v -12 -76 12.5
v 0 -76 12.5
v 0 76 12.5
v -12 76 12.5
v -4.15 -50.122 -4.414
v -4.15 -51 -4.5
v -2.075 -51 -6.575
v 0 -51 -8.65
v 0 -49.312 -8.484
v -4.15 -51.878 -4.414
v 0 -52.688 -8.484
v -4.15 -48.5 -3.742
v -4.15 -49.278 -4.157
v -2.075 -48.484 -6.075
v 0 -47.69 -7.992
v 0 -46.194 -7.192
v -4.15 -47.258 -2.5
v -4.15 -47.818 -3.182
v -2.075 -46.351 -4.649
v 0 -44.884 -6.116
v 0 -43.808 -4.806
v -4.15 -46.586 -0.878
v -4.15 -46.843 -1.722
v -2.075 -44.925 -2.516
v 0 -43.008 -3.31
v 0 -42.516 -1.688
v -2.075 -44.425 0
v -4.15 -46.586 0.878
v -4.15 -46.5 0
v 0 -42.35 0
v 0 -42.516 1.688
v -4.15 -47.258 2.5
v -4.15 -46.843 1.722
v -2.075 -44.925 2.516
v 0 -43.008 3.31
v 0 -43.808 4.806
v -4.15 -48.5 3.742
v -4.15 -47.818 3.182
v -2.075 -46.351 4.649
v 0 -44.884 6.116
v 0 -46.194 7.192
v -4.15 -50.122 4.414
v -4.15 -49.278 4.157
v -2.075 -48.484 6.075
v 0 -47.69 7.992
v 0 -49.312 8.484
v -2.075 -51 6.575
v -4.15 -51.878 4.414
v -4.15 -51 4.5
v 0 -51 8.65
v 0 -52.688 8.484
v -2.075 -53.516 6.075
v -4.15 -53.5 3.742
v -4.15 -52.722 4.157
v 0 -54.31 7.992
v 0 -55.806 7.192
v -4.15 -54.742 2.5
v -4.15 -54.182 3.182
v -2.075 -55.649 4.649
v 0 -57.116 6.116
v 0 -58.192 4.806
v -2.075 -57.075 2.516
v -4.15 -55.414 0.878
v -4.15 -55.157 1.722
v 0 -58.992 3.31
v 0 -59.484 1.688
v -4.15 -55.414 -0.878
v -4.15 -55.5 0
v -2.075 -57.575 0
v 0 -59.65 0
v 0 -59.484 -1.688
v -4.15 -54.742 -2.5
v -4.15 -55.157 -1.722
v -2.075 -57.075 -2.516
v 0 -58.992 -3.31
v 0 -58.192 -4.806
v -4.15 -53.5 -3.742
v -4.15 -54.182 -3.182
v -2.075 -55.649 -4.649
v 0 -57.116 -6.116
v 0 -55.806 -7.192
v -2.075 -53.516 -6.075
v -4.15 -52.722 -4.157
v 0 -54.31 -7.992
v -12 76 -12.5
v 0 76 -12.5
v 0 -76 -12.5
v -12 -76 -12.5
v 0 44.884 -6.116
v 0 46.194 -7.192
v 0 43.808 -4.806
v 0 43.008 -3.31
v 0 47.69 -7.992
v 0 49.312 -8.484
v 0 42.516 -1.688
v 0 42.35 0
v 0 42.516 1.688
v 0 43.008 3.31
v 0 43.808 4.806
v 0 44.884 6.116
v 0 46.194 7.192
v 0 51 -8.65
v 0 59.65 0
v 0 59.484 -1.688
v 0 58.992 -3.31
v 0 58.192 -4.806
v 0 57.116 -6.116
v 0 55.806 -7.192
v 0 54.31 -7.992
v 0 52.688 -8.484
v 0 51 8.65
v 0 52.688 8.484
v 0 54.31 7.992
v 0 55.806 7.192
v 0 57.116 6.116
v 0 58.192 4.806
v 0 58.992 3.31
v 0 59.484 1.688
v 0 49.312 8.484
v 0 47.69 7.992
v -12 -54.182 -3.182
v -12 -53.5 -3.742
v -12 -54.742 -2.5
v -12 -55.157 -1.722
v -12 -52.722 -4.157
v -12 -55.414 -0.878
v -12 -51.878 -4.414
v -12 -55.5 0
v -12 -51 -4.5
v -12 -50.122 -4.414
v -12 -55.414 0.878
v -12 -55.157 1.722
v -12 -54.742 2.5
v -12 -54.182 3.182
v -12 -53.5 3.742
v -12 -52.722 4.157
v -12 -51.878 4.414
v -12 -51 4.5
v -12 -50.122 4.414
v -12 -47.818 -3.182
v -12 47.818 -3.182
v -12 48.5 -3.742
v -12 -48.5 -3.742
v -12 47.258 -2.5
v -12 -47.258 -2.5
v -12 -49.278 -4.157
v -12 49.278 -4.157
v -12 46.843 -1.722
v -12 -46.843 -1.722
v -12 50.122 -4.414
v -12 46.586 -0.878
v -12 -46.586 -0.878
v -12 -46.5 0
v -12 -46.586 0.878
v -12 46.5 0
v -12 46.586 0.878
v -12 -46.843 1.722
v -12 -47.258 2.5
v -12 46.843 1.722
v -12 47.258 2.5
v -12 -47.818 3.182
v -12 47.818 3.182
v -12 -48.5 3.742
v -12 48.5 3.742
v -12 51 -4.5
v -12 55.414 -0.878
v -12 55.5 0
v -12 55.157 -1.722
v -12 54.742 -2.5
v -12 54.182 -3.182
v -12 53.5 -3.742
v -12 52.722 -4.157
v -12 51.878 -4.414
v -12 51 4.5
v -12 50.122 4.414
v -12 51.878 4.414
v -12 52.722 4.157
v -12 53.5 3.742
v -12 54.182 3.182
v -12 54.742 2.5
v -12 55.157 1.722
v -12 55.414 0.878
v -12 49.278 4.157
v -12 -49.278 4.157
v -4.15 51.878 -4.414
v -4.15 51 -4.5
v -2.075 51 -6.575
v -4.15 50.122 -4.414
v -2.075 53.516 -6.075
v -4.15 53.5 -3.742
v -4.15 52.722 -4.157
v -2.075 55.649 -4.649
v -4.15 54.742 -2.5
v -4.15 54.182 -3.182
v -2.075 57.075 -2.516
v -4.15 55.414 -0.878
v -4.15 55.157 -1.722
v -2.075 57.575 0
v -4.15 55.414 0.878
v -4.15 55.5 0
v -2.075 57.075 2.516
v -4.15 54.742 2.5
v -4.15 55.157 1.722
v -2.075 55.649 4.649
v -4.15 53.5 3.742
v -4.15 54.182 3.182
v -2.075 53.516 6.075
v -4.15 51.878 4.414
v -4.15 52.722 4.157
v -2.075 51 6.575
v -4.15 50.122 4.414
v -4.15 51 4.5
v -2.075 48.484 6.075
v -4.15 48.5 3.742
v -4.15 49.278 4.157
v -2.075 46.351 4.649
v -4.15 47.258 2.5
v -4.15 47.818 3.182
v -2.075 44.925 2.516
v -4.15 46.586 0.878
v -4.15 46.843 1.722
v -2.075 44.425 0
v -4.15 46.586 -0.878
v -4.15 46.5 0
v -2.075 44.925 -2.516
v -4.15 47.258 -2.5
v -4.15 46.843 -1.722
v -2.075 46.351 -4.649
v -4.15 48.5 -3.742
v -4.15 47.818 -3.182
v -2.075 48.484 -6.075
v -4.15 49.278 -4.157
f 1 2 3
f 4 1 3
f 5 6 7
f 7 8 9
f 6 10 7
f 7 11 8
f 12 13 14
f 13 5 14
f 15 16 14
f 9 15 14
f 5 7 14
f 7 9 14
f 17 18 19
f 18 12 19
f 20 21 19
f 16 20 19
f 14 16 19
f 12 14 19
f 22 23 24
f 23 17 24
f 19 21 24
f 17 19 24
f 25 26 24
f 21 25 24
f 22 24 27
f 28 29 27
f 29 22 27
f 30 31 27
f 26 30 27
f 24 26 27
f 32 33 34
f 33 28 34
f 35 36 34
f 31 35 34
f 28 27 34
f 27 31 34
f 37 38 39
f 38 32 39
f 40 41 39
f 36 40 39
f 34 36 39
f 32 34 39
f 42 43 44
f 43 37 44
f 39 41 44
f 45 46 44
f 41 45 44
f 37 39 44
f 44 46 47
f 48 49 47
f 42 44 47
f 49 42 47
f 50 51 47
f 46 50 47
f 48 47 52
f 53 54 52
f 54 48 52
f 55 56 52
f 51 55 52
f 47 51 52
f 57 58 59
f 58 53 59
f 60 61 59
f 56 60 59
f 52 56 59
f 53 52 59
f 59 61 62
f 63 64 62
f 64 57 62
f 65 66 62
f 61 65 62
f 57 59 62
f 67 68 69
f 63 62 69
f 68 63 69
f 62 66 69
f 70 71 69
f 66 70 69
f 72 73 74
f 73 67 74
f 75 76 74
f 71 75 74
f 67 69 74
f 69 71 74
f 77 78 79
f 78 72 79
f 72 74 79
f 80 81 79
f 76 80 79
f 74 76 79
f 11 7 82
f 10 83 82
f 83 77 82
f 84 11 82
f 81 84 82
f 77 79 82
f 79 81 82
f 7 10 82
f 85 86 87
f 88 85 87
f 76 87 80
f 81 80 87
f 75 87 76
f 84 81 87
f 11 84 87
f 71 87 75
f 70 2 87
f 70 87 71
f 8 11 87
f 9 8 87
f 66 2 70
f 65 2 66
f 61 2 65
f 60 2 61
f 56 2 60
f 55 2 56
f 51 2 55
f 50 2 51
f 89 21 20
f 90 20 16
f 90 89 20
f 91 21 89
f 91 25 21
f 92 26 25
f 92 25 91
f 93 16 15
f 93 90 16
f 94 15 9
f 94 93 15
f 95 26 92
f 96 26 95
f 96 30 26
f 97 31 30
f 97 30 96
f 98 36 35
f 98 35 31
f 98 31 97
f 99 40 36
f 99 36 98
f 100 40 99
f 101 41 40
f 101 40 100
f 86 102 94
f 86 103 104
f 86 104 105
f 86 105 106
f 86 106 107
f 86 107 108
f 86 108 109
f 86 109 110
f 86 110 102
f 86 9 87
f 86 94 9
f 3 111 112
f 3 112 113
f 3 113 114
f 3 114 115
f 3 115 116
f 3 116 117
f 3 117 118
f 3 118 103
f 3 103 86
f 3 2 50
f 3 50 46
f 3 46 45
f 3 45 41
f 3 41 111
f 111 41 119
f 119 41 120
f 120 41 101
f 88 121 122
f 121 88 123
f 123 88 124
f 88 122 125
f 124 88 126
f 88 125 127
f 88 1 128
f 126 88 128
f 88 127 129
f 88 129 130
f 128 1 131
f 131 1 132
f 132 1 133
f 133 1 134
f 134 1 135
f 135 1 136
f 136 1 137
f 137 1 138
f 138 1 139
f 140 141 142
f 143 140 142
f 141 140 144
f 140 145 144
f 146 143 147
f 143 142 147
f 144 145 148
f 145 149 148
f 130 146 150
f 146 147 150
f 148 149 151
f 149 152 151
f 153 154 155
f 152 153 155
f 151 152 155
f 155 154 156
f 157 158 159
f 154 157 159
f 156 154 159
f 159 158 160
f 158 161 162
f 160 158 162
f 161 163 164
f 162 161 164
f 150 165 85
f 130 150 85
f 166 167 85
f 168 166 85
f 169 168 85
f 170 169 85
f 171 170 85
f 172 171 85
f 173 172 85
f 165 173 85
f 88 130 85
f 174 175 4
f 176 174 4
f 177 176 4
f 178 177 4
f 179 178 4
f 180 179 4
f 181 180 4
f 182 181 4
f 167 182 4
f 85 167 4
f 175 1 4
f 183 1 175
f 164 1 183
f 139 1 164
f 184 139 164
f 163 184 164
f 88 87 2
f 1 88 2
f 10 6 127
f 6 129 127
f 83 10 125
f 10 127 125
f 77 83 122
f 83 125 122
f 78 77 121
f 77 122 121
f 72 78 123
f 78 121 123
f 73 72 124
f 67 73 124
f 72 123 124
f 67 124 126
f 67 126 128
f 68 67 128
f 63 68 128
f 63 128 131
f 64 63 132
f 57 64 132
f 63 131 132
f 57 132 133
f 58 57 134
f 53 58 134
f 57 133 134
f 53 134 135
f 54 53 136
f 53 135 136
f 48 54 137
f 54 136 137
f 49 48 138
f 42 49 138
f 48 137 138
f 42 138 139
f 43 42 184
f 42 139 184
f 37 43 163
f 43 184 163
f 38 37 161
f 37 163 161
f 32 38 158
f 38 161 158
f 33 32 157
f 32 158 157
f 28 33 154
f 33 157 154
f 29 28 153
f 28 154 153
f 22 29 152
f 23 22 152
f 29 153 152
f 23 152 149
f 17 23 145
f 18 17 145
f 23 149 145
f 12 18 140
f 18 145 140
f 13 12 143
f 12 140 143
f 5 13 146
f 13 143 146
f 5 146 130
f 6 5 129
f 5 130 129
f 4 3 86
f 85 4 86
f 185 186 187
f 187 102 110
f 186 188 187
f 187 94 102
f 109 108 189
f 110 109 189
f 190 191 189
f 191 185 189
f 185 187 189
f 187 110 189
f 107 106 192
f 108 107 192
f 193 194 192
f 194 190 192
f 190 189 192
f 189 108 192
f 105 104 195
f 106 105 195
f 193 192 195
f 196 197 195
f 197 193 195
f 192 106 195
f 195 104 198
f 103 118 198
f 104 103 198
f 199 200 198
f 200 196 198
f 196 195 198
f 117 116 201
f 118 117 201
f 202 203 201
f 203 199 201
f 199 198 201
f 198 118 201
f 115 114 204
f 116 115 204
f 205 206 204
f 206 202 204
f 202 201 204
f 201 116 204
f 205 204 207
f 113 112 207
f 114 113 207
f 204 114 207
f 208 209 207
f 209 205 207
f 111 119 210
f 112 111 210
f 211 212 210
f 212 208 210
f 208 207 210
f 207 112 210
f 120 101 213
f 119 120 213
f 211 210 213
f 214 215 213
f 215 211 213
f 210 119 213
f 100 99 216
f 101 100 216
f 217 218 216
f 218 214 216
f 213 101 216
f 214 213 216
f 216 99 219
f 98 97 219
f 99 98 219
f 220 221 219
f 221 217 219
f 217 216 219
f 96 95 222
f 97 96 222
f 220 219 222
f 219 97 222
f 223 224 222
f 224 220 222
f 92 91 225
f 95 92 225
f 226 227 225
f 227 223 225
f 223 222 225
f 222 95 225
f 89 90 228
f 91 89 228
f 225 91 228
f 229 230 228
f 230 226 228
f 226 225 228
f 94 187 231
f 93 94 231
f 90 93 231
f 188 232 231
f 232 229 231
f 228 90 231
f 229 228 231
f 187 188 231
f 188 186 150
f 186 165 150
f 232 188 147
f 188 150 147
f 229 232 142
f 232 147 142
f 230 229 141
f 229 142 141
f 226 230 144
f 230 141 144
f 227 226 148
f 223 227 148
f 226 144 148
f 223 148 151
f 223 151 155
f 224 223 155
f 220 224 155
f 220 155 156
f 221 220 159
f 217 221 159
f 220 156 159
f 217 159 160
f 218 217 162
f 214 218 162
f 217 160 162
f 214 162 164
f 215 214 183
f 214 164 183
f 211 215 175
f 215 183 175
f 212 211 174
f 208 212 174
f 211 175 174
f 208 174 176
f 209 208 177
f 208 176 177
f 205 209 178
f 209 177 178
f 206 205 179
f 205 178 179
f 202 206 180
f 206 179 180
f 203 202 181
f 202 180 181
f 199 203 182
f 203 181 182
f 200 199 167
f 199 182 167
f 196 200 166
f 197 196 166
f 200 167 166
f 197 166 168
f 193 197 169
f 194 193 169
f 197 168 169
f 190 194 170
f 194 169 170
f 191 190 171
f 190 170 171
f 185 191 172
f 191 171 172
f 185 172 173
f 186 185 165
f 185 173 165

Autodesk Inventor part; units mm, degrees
ref_plane "YZ Plane" through (0, 0, 0) normal (1, 0, 0) x (0, 1, 0)
ref_plane "XZ Plane" through (0, 0, 0) normal (0, 1, 0) x (-1, 0, 0)
ref_plane "XY Plane" through (0, 0, 0) normal (0, 0, 1) x (1, 0, 0)
sketch "Sketch1" plane through (0, 0, 0) normal (1, 0, 0) x (0, 1, 0)
  line L0 (-76, 12.5) -> (76, 12.5)
  line L1 (76, 12.5) -> (76, -12.5)
  line L2 (76, -12.5) -> (-76, -12.5)
  line L3 (-76, -12.5) -> (-76, 12.5)
  line L4 (-85.317, 0) -> (85.317, 0) construction
  point P0 (0, 0)
  point P1 (0, 0)
  point P2 (-51, 0)
  point P3 (51, 0)
  dimension "d0" = 152
  dimension "d1" = 25
  dimension "d2" = 76
  dimension "d3" = 12.5
  dimension "d4" = 25
  dimension "d5" = 25
extrude "Extrusion1" add sketch "Sketch1" against normal blind 12
hole "Hole1" at (0, -51, 0) at (0, 51, 0) direction (-1, 0, 0) diameter 9 end through all countersink diameter 17.3 countersink angle 90 clearance for "Countersunk Flat Head Screw ISO 2009/7046" size "M8" standard "ISO"
equation "\"d2\" = 0.5 * d0"
equation "\"d3\" = 0.5 * d1"
properties part number "JAW CAP" material "Steel, Alloy"
